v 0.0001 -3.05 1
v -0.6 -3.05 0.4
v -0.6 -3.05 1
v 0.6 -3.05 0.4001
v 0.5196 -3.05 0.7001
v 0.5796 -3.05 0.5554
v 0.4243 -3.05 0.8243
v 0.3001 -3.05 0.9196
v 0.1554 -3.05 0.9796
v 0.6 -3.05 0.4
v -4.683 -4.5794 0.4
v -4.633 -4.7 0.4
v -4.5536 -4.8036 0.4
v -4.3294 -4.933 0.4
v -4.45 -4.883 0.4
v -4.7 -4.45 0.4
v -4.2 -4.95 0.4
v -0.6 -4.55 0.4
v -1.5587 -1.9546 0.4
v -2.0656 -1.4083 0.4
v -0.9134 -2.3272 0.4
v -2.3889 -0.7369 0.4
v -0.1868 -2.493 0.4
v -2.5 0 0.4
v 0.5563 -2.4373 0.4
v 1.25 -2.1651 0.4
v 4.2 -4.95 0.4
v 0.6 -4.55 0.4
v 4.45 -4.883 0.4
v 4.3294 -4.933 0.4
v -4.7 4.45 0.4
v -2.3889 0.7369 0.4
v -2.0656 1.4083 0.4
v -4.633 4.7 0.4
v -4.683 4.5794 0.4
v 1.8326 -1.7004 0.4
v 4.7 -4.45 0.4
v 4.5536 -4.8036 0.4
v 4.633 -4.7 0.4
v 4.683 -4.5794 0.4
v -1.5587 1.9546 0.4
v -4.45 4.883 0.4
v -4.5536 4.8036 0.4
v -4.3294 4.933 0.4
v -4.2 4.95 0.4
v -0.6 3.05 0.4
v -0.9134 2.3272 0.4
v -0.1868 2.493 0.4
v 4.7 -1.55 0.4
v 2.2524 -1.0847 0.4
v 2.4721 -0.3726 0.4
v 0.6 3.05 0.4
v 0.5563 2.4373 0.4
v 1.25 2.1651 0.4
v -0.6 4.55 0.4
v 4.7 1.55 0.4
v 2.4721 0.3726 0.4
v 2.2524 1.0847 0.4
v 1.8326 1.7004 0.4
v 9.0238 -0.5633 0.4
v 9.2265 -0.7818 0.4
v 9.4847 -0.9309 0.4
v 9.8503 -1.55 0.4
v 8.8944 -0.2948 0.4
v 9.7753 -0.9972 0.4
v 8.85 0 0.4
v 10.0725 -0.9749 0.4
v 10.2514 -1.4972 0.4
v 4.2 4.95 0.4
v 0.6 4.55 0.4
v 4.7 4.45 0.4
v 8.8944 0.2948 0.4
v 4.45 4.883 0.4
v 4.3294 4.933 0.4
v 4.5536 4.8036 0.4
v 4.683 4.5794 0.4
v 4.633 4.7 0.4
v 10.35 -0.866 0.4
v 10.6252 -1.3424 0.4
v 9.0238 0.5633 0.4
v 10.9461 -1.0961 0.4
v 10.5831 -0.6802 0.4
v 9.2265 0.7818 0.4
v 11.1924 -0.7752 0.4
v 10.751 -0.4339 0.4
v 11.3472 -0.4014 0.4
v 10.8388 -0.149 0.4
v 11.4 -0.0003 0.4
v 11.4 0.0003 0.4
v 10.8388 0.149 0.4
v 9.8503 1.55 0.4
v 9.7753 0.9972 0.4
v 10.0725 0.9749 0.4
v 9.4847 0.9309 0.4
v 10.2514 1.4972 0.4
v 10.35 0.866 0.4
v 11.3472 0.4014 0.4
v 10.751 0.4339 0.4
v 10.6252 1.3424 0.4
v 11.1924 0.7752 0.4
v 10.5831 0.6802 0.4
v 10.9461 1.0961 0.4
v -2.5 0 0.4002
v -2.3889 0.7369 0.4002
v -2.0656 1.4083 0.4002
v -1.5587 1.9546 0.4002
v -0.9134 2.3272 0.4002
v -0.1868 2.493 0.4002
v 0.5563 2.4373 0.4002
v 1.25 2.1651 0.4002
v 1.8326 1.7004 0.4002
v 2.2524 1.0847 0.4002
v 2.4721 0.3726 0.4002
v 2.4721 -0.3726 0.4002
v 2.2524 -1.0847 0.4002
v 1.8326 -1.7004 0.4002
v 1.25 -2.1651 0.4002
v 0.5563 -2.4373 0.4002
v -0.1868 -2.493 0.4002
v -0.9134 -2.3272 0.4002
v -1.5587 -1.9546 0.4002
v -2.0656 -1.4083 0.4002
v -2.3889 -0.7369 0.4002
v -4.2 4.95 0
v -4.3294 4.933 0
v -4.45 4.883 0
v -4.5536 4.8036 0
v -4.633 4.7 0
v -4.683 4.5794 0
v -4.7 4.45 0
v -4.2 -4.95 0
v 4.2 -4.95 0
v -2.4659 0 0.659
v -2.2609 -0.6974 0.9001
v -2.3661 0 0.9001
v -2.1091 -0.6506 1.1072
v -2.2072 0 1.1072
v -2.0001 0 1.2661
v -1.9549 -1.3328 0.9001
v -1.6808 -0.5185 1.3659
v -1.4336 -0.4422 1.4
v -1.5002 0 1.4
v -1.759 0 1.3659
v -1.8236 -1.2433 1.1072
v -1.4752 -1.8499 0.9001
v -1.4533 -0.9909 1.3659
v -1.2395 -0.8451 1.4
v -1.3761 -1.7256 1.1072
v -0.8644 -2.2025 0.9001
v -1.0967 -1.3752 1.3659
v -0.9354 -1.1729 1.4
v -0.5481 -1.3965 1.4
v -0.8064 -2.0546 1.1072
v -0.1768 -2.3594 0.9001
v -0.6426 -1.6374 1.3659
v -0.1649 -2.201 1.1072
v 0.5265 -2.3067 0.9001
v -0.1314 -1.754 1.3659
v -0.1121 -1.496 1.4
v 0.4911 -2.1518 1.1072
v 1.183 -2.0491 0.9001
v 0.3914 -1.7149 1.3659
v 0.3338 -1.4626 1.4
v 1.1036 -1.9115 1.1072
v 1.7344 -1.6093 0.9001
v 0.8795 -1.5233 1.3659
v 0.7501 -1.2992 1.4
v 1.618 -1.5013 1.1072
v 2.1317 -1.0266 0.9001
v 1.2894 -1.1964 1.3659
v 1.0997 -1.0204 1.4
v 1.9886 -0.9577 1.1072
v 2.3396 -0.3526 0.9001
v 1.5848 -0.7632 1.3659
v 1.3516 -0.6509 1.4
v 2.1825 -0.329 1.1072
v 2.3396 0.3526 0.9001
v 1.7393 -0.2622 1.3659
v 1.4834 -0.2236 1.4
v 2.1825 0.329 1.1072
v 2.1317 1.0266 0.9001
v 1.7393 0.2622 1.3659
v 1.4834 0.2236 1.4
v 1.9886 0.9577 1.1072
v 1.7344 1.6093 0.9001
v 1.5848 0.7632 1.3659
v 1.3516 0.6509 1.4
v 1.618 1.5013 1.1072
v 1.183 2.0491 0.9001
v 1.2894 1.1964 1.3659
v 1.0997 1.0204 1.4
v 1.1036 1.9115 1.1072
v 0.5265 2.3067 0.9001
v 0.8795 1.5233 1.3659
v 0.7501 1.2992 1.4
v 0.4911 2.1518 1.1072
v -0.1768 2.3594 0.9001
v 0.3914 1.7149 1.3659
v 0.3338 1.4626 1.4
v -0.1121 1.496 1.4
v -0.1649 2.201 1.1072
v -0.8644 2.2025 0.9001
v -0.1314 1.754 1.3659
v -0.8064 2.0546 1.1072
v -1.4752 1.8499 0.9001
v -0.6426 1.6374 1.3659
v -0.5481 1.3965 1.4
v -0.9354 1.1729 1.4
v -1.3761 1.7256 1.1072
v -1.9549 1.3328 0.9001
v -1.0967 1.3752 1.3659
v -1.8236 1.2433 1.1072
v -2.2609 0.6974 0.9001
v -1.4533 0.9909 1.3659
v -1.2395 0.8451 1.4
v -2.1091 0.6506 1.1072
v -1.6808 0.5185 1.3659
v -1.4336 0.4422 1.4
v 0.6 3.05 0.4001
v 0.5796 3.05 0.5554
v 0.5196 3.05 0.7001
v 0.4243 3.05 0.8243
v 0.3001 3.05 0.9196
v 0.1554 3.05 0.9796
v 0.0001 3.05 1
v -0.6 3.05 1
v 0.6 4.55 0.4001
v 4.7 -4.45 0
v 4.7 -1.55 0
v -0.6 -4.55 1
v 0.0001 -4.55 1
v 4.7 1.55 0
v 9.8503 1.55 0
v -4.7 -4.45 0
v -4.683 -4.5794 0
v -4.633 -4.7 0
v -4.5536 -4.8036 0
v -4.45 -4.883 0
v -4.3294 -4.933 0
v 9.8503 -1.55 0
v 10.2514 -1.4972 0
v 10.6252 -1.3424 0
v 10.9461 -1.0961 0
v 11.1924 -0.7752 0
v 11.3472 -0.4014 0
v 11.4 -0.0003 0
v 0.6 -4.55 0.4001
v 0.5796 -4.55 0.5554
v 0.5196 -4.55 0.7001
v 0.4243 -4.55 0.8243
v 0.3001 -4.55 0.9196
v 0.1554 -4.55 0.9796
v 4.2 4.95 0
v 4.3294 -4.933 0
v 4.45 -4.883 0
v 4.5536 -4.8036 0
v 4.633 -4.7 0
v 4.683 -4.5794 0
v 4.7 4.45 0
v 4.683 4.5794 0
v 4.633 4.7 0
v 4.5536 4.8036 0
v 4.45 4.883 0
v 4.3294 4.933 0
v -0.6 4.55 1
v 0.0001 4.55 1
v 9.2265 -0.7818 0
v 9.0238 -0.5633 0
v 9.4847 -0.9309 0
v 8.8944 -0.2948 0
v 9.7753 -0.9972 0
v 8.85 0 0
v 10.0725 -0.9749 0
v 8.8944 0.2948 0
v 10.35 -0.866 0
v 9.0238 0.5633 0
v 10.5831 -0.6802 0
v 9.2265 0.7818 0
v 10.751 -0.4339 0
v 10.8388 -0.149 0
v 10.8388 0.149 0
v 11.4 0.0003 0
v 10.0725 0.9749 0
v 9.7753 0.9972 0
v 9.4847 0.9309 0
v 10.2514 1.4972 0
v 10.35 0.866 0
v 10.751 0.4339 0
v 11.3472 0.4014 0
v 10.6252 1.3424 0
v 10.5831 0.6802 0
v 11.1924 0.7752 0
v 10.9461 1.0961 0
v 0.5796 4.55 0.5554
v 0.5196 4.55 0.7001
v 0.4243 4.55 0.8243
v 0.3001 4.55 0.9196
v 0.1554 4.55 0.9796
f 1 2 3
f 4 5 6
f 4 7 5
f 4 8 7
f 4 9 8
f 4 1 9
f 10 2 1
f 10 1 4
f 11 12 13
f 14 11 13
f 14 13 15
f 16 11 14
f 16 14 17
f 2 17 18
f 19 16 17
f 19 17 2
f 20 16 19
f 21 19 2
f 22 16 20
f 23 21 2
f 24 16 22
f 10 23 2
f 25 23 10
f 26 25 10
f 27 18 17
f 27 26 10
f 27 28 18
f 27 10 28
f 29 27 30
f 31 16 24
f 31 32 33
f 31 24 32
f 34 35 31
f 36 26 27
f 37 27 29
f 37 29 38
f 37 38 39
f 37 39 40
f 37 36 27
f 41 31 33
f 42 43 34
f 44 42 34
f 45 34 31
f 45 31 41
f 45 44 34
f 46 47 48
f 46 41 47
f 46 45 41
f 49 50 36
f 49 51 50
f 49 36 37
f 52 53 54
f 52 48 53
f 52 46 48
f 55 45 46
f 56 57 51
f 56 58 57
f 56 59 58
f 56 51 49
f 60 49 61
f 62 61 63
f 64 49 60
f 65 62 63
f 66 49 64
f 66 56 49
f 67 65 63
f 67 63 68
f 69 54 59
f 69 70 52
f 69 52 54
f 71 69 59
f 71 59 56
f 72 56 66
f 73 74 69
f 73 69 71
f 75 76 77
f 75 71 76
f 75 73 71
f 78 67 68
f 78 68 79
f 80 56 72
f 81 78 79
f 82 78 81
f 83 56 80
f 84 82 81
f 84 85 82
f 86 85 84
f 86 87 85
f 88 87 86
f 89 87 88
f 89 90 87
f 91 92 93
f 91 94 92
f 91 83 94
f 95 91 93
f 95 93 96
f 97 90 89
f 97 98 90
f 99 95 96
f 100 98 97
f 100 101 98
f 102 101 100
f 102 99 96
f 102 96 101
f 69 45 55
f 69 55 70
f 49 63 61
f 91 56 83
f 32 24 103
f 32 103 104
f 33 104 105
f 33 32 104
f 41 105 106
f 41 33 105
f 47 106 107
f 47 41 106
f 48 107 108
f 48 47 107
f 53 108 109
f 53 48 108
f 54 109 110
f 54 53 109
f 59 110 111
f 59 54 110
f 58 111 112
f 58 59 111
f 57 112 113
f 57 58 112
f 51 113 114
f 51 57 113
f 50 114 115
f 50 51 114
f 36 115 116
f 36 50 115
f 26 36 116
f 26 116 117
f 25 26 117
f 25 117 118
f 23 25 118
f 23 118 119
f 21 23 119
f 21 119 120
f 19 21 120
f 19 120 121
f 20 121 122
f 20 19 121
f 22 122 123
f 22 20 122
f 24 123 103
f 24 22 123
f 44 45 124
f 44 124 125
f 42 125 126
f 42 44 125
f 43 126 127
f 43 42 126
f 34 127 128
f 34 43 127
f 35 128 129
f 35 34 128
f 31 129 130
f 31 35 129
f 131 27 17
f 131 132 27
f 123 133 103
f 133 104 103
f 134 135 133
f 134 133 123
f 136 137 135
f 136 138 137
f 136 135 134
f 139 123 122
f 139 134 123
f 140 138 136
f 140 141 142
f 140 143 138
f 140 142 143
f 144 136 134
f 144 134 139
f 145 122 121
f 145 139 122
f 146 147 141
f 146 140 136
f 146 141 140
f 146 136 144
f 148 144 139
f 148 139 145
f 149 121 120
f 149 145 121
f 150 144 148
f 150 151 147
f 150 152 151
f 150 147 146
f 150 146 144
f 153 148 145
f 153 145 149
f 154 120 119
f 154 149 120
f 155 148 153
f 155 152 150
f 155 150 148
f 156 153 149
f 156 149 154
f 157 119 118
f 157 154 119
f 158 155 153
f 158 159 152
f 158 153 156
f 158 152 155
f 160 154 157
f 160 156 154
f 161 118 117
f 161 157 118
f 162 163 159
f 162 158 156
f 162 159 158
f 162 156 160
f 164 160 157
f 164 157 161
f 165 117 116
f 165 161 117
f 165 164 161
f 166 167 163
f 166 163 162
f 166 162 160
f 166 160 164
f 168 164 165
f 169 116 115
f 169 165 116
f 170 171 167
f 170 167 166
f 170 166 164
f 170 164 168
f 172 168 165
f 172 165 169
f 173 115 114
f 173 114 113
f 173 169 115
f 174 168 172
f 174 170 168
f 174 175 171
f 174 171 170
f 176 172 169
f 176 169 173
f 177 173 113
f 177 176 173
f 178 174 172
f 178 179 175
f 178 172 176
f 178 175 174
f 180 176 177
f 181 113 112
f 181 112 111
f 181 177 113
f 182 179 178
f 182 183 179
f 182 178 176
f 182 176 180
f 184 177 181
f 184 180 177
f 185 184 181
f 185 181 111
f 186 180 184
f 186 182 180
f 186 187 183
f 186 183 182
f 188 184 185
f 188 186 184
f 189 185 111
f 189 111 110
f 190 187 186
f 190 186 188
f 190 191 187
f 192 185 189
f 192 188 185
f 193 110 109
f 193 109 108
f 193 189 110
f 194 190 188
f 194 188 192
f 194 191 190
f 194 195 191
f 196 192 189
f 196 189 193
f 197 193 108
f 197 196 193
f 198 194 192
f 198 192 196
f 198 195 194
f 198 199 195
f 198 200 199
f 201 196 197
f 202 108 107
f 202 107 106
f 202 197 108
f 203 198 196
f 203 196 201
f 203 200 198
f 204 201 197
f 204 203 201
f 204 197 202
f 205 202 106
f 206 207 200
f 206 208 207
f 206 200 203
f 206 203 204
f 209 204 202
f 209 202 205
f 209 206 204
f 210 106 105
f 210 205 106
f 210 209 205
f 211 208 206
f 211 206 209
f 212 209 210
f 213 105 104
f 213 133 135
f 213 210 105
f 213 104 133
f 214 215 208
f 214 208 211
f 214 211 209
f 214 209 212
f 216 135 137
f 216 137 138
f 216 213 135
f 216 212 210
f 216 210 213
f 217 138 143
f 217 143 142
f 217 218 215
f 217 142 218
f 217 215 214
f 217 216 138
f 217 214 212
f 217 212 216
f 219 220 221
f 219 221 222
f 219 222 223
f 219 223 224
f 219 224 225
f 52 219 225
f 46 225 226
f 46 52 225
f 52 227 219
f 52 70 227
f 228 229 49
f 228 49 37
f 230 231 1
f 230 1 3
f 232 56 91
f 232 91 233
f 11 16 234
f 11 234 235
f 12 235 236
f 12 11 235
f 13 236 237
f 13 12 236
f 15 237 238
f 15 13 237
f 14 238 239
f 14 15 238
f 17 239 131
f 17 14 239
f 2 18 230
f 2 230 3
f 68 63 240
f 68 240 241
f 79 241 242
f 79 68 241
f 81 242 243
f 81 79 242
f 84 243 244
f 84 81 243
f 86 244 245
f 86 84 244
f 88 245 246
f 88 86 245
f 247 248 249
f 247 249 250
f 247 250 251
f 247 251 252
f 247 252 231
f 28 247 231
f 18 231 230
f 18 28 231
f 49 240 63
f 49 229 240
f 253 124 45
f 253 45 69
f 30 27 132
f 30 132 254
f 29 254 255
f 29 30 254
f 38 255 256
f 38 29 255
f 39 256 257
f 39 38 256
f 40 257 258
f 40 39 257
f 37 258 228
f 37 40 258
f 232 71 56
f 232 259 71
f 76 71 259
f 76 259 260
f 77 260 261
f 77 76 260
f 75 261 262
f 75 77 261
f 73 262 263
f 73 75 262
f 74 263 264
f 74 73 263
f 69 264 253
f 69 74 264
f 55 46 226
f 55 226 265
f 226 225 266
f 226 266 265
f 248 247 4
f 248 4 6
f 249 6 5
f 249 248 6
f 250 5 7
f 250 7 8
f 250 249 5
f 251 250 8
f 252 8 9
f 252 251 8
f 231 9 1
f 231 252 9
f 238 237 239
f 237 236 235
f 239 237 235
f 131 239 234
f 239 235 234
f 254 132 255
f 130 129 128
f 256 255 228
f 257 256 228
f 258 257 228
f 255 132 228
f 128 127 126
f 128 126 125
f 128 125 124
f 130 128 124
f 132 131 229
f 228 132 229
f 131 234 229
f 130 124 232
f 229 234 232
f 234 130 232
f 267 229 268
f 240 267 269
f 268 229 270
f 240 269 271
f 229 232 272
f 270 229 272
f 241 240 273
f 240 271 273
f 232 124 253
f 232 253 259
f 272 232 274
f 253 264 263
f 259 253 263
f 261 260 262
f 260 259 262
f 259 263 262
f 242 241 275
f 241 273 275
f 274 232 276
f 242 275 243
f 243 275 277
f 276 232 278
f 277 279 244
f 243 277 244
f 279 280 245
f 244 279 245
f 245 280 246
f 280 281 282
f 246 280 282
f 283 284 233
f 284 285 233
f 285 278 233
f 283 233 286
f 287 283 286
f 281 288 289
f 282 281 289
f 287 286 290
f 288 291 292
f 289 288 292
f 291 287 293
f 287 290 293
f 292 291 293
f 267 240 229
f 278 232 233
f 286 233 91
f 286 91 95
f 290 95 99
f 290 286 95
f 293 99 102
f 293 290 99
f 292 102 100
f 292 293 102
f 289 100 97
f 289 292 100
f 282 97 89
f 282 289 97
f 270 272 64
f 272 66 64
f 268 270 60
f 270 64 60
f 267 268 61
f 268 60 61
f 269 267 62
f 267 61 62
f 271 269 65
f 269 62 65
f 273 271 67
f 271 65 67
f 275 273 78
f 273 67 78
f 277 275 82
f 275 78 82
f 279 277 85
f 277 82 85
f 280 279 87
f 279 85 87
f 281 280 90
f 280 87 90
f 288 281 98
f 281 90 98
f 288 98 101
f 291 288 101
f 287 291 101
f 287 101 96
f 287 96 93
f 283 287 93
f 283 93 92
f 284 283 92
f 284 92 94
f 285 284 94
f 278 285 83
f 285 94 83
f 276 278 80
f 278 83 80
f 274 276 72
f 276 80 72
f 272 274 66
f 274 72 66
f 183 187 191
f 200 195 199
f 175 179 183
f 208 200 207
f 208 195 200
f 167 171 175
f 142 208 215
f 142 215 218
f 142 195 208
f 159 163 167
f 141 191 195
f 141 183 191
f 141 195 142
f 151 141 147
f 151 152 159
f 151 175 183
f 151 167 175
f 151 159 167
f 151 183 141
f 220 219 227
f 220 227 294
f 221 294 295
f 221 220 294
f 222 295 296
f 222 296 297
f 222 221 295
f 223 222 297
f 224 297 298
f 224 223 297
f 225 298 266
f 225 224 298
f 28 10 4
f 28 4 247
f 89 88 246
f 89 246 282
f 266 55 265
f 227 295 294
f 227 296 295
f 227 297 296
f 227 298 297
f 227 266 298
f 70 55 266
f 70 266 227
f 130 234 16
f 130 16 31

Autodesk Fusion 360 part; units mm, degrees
sketch "Base" plane through (0, 0, 0) normal (0, 0, 1) x (1, 0, 0) in component "Positive Connector"
  line L0 (4.7, -4.95) -> (-4.7, -4.95)
  line L1 (-4.7, -4.95) -> (-4.7, 4.95)
  line L2 (-4.7, 4.95) -> (4.7, 4.95)
  line L3 (4.7, 4.95) -> (4.7, -4.95)
  line L4 (4.7, -4.95) -> (-4.7, 4.95) construction
  line L5 (-4.7, -4.95) -> (4.7, 4.95) construction
  dimension "d1" = 9.4
  dimension "d2" = 9.9
extrude "Extrude1" add sketch "Base" along normal blind 0.4 in component "Positive Connector"
fillet "Fillet1" radius 0.5 4 edges at (4.7, -4.95, 0.2) (4.7, 4.95, 0.2) (-4.7, 4.95, 0.2) (-4.7, -4.95, 0.2) in component "Positive Connector"
sketch "Connector" plane through (4.7, 0, 0) normal (1, 0, 0) x (0, 1, 0) in component "Positive Connector"
  line L0 (4.45, 0) -> (4.45, 0.4)
  line L1 (4.45, 0.4) -> (-4.45, 0.4)
  line L2 (-4.45, 0.4) -> (-4.45, 0)
  line L3 (-4.45, 0) -> (4.45, 0)
  line L4 (-4.45, 0.2) -> (4.45, 0.2) construction
  line L5 (1.55, 0) -> (-1.55, 0)
  line L6 (-1.55, 0) -> (-1.55, 0.4)
  line L7 (-1.55, 0.4) -> (1.55, 0.4)
  line L8 (1.55, 0.4) -> (1.55, 0)
  line L9 (1.55, 0) -> (-1.55, 0.4) construction
  line L10 (-1.55, 0) -> (1.55, 0.4) construction
  point P0 (0, 0.2)
  dimension "d6" = 3.1
extrude "Extrude2" add sketch "Connector" along normal blind 6.7 contours L1 L3 L5 L6 L7 L8 in component "Positive Connector"
fillet "Fillet2" radius 1.55 2 edges at (11.4, -1.55, 0.2) (11.4, 1.55, 0.2) in component "Positive Connector"
sketch "Taps" plane through (0, 0, 0.4) normal (0, 0, 1) x (-1, 0, 0) in component "Positive Connector"
  arc A0 (-9.85, 1.55) -> (-9.85, -1.55) centre (-9.85, 0) ccw
  line L0 (-9.85, -1.55) -> (-4.7, -1.55)
  line L1 (-4.7, -1.55) -> (-4.7, -4.45)
  arc A1 (-4.7, -4.45) -> (-4.2, -4.95) centre (-4.2, -4.45) ccw
  line L2 (-4.2, -4.95) -> (4.2, -4.95)
  arc A2 (4.2, -4.95) -> (4.7, -4.45) centre (4.2, -4.45) ccw
  line L3 (4.7, -4.45) -> (4.7, 4.45)
  arc A3 (4.7, 4.45) -> (4.2, 4.95) centre (4.2, 4.45) ccw
  line L4 (4.2, 4.95) -> (-4.2, 4.95)
  arc A4 (-4.2, 4.95) -> (-4.7, 4.45) centre (-4.2, 4.45) ccw
  line L5 (-4.7, 4.45) -> (-4.7, 1.55)
  line L6 (-4.7, 1.55) -> (-9.85, 1.55)
  line L7 (4.7, 0) -> (-11.4, 0) construction
  line L8 (-9.85, -1.55) -> (-9.85, 1.55) construction
  circle A5 centre (-9.85, 0) radius 1
  line L9 (0, -4.95) -> (0, 4.95) construction
  circle A6 centre (0, 0) radius 2.5
  line L10 (-0.6, -3.05) -> (0.6, -3.05)
  line L11 (0.6, -3.05) -> (0.6, -4.55)
  line L12 (0.6, -4.55) -> (-0.6, -4.55)
  line L13 (-0.6, -4.55) -> (-0.6, -3.05)
  line L14 (-0.6, -3.05) -> (0.6, -4.55) construction
  line L15 (0.6, -3.05) -> (-0.6, -4.55) construction
  line L16 (-0.6, 4.55) -> (0.6, 4.55)
  line L17 (0.6, 4.55) -> (0.6, 3.05)
  line L18 (0.6, 3.05) -> (-0.6, 3.05)
  line L19 (-0.6, 3.05) -> (-0.6, 4.55)
  line L20 (-0.6, 4.55) -> (0.6, 3.05) construction
  line L21 (0.6, 4.55) -> (-0.6, 3.05) construction
  point P0 (0, -3.8)
  point P1 (0, 3.8)
  dimension "d10" = 1.55
  dimension "d11" = 2
  dimension "d12" = 5
  dimension "d13" = 1.2
  dimension "d14" = 1.5
  dimension "d15" = 0.4
  dimension "d16" = 1.2
  dimension "d17" = 1.5
  dimension "d18" = 0.4
extrude "Extrude3" cut sketch "Taps" against normal up to surface (0.4 mm away) contours A5 in component "Positive Connector"
extrude "Extrude4" add sketch "Taps" along normal blind 0.6 contours L10 L11 L12 L13 | L16 L17 L18 L19 in component "Positive Connector"
fillet "Fillet3" radius 0.6 2 edges at (0.6, 3.8, 1) (0.6, -3.8, 1) in component "Positive Connector"
extrude "Extrude5" add sketch "Taps" along normal blind 1 contours A6 in component "Positive Connector"
fillet "Fillet4" radius 1 1 edges at (2.3308, 0.904, 1.4) in component "Positive Connector"
component "Positive Connector" placed x (1, 0, 0) y (0, 1, 0) z (0, 0, 1) at (0, 0, 0)
